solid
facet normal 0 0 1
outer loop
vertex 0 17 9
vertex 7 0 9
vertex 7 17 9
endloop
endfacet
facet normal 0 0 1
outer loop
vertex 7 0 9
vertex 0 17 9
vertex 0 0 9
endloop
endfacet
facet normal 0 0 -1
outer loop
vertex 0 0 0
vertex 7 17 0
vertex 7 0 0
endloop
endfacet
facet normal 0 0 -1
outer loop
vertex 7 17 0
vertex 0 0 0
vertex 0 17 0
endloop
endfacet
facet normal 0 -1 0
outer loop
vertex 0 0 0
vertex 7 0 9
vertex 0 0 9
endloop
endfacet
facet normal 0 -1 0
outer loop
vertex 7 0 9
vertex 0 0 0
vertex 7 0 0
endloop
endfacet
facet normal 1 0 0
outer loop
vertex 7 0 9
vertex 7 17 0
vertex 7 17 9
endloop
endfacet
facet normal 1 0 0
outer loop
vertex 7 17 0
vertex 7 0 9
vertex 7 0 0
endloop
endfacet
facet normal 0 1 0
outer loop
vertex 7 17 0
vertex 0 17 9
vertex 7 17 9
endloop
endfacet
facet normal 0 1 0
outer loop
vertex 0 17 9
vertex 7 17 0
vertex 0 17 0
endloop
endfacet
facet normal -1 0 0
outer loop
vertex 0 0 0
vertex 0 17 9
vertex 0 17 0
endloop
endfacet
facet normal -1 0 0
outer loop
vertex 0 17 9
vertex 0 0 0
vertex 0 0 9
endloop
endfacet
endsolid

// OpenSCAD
// Generated by SolidPython 1.0.1 on 2020-07-29 00:46:55


cube(size = [7, 17, 9]);
/***********************************************
*********      SolidPython code:      **********
************************************************
 
# import packages: SolidPython
from solid import *
from solid.utils import *
from itertools import chain, combinations, permutations


class Resize:

    def __init__(self, scad_file):
        self.scad_file = scad_file
        #self.scad_file = import_scad(scad_file)
        # cone/cylinder param:
        self.r1 = 0
        self.r2 = 0
        self.h = 0
        # rectangular prism param:
        self.w = 0
        self.l = 0
        # ellipse param:
        self.r = 0

    # import OpenScad code (file name corresponds to shape)


    # classify shape + parameters
    def assign(self, param1, param2, param3):
        if self.scad_file == 'cone.scad':
            self.r1 = param1
            self.r2 = param2
            self.h = param3
        elif self.scad_file == 'cylinder.scad':
            self.r1 = param1
            self.r2 = param2
            self.h = param3
        elif self.scad_file == 'rectangularPrism.scad':
            self.h = param1
            self.l = param2
            self.w = param3
        else:
            self.r = param1
            self.h = param2

    # resize parameters
    def iterate(self):
        x = range(3, 20, 2)
        i = 1
        if self.scad_file == 'cone.scad':
            tempList = list(permutations(x, 2))
            for temp in tempList:
                param1 = temp[0]
                param2 = temp[1]
                filepath = 'produced_scad_files/' + 'cone' + str(param1) + '_' + str(param2) + '_' + '.scad'
                scad_render_to_file(cylinder(h=param1, r1=param2, r2=0), filepath)

        elif self.scad_file == 'cylinder.scad':
            tempList = list(permutations(x, 3))
            for temp in tempList:
                param1 = temp[0]
                param2 = temp[1]
                filepath = 'produced_scad_files/' + 'cylinder' + str(param1) + '_' + str(param2) + '_' + '.scad'
                scad_render_to_file(cylinder(h=param1, r1=param2, r2=param2), filepath)

        elif self.scad_file == 'rectangularPrism.scad':
            tempList = list(permutations(x, 3))
            for temp in tempList:
                param1 = temp[0]
                param2 = temp[1]
                param3 = temp[2]
                filepath = 'produced_scad_files/' + 'rectangularPrism' + str(param1) + '_' + str(param2) + '_' + str(
                    param3) + '.scad'
                scad_render_to_file(cube(size=(param1, param2, param3)), filepath)

        elif self.scad_file == 'ellipse.scad':
            tempList = list(permutations(x, 4))
            for temp in tempList:
                param1 = temp[0]
                param2 = temp[1]
                param3 = temp[2]
                param4 = temp[3]
                filepath = 'produced_scad_files/' + 'ellipse' + str(param1) + '_' + str(param2) + '_' + str(param3) + '_' + str(param4) + '.scad'
                scad_render_to_file(scale([param1, param2, param3])(sphere(r=param4)), filepath)

    def render_to_scadfile(self):
        scad_render_to_file(scad, 'example.scad') 
 
************************************************/
